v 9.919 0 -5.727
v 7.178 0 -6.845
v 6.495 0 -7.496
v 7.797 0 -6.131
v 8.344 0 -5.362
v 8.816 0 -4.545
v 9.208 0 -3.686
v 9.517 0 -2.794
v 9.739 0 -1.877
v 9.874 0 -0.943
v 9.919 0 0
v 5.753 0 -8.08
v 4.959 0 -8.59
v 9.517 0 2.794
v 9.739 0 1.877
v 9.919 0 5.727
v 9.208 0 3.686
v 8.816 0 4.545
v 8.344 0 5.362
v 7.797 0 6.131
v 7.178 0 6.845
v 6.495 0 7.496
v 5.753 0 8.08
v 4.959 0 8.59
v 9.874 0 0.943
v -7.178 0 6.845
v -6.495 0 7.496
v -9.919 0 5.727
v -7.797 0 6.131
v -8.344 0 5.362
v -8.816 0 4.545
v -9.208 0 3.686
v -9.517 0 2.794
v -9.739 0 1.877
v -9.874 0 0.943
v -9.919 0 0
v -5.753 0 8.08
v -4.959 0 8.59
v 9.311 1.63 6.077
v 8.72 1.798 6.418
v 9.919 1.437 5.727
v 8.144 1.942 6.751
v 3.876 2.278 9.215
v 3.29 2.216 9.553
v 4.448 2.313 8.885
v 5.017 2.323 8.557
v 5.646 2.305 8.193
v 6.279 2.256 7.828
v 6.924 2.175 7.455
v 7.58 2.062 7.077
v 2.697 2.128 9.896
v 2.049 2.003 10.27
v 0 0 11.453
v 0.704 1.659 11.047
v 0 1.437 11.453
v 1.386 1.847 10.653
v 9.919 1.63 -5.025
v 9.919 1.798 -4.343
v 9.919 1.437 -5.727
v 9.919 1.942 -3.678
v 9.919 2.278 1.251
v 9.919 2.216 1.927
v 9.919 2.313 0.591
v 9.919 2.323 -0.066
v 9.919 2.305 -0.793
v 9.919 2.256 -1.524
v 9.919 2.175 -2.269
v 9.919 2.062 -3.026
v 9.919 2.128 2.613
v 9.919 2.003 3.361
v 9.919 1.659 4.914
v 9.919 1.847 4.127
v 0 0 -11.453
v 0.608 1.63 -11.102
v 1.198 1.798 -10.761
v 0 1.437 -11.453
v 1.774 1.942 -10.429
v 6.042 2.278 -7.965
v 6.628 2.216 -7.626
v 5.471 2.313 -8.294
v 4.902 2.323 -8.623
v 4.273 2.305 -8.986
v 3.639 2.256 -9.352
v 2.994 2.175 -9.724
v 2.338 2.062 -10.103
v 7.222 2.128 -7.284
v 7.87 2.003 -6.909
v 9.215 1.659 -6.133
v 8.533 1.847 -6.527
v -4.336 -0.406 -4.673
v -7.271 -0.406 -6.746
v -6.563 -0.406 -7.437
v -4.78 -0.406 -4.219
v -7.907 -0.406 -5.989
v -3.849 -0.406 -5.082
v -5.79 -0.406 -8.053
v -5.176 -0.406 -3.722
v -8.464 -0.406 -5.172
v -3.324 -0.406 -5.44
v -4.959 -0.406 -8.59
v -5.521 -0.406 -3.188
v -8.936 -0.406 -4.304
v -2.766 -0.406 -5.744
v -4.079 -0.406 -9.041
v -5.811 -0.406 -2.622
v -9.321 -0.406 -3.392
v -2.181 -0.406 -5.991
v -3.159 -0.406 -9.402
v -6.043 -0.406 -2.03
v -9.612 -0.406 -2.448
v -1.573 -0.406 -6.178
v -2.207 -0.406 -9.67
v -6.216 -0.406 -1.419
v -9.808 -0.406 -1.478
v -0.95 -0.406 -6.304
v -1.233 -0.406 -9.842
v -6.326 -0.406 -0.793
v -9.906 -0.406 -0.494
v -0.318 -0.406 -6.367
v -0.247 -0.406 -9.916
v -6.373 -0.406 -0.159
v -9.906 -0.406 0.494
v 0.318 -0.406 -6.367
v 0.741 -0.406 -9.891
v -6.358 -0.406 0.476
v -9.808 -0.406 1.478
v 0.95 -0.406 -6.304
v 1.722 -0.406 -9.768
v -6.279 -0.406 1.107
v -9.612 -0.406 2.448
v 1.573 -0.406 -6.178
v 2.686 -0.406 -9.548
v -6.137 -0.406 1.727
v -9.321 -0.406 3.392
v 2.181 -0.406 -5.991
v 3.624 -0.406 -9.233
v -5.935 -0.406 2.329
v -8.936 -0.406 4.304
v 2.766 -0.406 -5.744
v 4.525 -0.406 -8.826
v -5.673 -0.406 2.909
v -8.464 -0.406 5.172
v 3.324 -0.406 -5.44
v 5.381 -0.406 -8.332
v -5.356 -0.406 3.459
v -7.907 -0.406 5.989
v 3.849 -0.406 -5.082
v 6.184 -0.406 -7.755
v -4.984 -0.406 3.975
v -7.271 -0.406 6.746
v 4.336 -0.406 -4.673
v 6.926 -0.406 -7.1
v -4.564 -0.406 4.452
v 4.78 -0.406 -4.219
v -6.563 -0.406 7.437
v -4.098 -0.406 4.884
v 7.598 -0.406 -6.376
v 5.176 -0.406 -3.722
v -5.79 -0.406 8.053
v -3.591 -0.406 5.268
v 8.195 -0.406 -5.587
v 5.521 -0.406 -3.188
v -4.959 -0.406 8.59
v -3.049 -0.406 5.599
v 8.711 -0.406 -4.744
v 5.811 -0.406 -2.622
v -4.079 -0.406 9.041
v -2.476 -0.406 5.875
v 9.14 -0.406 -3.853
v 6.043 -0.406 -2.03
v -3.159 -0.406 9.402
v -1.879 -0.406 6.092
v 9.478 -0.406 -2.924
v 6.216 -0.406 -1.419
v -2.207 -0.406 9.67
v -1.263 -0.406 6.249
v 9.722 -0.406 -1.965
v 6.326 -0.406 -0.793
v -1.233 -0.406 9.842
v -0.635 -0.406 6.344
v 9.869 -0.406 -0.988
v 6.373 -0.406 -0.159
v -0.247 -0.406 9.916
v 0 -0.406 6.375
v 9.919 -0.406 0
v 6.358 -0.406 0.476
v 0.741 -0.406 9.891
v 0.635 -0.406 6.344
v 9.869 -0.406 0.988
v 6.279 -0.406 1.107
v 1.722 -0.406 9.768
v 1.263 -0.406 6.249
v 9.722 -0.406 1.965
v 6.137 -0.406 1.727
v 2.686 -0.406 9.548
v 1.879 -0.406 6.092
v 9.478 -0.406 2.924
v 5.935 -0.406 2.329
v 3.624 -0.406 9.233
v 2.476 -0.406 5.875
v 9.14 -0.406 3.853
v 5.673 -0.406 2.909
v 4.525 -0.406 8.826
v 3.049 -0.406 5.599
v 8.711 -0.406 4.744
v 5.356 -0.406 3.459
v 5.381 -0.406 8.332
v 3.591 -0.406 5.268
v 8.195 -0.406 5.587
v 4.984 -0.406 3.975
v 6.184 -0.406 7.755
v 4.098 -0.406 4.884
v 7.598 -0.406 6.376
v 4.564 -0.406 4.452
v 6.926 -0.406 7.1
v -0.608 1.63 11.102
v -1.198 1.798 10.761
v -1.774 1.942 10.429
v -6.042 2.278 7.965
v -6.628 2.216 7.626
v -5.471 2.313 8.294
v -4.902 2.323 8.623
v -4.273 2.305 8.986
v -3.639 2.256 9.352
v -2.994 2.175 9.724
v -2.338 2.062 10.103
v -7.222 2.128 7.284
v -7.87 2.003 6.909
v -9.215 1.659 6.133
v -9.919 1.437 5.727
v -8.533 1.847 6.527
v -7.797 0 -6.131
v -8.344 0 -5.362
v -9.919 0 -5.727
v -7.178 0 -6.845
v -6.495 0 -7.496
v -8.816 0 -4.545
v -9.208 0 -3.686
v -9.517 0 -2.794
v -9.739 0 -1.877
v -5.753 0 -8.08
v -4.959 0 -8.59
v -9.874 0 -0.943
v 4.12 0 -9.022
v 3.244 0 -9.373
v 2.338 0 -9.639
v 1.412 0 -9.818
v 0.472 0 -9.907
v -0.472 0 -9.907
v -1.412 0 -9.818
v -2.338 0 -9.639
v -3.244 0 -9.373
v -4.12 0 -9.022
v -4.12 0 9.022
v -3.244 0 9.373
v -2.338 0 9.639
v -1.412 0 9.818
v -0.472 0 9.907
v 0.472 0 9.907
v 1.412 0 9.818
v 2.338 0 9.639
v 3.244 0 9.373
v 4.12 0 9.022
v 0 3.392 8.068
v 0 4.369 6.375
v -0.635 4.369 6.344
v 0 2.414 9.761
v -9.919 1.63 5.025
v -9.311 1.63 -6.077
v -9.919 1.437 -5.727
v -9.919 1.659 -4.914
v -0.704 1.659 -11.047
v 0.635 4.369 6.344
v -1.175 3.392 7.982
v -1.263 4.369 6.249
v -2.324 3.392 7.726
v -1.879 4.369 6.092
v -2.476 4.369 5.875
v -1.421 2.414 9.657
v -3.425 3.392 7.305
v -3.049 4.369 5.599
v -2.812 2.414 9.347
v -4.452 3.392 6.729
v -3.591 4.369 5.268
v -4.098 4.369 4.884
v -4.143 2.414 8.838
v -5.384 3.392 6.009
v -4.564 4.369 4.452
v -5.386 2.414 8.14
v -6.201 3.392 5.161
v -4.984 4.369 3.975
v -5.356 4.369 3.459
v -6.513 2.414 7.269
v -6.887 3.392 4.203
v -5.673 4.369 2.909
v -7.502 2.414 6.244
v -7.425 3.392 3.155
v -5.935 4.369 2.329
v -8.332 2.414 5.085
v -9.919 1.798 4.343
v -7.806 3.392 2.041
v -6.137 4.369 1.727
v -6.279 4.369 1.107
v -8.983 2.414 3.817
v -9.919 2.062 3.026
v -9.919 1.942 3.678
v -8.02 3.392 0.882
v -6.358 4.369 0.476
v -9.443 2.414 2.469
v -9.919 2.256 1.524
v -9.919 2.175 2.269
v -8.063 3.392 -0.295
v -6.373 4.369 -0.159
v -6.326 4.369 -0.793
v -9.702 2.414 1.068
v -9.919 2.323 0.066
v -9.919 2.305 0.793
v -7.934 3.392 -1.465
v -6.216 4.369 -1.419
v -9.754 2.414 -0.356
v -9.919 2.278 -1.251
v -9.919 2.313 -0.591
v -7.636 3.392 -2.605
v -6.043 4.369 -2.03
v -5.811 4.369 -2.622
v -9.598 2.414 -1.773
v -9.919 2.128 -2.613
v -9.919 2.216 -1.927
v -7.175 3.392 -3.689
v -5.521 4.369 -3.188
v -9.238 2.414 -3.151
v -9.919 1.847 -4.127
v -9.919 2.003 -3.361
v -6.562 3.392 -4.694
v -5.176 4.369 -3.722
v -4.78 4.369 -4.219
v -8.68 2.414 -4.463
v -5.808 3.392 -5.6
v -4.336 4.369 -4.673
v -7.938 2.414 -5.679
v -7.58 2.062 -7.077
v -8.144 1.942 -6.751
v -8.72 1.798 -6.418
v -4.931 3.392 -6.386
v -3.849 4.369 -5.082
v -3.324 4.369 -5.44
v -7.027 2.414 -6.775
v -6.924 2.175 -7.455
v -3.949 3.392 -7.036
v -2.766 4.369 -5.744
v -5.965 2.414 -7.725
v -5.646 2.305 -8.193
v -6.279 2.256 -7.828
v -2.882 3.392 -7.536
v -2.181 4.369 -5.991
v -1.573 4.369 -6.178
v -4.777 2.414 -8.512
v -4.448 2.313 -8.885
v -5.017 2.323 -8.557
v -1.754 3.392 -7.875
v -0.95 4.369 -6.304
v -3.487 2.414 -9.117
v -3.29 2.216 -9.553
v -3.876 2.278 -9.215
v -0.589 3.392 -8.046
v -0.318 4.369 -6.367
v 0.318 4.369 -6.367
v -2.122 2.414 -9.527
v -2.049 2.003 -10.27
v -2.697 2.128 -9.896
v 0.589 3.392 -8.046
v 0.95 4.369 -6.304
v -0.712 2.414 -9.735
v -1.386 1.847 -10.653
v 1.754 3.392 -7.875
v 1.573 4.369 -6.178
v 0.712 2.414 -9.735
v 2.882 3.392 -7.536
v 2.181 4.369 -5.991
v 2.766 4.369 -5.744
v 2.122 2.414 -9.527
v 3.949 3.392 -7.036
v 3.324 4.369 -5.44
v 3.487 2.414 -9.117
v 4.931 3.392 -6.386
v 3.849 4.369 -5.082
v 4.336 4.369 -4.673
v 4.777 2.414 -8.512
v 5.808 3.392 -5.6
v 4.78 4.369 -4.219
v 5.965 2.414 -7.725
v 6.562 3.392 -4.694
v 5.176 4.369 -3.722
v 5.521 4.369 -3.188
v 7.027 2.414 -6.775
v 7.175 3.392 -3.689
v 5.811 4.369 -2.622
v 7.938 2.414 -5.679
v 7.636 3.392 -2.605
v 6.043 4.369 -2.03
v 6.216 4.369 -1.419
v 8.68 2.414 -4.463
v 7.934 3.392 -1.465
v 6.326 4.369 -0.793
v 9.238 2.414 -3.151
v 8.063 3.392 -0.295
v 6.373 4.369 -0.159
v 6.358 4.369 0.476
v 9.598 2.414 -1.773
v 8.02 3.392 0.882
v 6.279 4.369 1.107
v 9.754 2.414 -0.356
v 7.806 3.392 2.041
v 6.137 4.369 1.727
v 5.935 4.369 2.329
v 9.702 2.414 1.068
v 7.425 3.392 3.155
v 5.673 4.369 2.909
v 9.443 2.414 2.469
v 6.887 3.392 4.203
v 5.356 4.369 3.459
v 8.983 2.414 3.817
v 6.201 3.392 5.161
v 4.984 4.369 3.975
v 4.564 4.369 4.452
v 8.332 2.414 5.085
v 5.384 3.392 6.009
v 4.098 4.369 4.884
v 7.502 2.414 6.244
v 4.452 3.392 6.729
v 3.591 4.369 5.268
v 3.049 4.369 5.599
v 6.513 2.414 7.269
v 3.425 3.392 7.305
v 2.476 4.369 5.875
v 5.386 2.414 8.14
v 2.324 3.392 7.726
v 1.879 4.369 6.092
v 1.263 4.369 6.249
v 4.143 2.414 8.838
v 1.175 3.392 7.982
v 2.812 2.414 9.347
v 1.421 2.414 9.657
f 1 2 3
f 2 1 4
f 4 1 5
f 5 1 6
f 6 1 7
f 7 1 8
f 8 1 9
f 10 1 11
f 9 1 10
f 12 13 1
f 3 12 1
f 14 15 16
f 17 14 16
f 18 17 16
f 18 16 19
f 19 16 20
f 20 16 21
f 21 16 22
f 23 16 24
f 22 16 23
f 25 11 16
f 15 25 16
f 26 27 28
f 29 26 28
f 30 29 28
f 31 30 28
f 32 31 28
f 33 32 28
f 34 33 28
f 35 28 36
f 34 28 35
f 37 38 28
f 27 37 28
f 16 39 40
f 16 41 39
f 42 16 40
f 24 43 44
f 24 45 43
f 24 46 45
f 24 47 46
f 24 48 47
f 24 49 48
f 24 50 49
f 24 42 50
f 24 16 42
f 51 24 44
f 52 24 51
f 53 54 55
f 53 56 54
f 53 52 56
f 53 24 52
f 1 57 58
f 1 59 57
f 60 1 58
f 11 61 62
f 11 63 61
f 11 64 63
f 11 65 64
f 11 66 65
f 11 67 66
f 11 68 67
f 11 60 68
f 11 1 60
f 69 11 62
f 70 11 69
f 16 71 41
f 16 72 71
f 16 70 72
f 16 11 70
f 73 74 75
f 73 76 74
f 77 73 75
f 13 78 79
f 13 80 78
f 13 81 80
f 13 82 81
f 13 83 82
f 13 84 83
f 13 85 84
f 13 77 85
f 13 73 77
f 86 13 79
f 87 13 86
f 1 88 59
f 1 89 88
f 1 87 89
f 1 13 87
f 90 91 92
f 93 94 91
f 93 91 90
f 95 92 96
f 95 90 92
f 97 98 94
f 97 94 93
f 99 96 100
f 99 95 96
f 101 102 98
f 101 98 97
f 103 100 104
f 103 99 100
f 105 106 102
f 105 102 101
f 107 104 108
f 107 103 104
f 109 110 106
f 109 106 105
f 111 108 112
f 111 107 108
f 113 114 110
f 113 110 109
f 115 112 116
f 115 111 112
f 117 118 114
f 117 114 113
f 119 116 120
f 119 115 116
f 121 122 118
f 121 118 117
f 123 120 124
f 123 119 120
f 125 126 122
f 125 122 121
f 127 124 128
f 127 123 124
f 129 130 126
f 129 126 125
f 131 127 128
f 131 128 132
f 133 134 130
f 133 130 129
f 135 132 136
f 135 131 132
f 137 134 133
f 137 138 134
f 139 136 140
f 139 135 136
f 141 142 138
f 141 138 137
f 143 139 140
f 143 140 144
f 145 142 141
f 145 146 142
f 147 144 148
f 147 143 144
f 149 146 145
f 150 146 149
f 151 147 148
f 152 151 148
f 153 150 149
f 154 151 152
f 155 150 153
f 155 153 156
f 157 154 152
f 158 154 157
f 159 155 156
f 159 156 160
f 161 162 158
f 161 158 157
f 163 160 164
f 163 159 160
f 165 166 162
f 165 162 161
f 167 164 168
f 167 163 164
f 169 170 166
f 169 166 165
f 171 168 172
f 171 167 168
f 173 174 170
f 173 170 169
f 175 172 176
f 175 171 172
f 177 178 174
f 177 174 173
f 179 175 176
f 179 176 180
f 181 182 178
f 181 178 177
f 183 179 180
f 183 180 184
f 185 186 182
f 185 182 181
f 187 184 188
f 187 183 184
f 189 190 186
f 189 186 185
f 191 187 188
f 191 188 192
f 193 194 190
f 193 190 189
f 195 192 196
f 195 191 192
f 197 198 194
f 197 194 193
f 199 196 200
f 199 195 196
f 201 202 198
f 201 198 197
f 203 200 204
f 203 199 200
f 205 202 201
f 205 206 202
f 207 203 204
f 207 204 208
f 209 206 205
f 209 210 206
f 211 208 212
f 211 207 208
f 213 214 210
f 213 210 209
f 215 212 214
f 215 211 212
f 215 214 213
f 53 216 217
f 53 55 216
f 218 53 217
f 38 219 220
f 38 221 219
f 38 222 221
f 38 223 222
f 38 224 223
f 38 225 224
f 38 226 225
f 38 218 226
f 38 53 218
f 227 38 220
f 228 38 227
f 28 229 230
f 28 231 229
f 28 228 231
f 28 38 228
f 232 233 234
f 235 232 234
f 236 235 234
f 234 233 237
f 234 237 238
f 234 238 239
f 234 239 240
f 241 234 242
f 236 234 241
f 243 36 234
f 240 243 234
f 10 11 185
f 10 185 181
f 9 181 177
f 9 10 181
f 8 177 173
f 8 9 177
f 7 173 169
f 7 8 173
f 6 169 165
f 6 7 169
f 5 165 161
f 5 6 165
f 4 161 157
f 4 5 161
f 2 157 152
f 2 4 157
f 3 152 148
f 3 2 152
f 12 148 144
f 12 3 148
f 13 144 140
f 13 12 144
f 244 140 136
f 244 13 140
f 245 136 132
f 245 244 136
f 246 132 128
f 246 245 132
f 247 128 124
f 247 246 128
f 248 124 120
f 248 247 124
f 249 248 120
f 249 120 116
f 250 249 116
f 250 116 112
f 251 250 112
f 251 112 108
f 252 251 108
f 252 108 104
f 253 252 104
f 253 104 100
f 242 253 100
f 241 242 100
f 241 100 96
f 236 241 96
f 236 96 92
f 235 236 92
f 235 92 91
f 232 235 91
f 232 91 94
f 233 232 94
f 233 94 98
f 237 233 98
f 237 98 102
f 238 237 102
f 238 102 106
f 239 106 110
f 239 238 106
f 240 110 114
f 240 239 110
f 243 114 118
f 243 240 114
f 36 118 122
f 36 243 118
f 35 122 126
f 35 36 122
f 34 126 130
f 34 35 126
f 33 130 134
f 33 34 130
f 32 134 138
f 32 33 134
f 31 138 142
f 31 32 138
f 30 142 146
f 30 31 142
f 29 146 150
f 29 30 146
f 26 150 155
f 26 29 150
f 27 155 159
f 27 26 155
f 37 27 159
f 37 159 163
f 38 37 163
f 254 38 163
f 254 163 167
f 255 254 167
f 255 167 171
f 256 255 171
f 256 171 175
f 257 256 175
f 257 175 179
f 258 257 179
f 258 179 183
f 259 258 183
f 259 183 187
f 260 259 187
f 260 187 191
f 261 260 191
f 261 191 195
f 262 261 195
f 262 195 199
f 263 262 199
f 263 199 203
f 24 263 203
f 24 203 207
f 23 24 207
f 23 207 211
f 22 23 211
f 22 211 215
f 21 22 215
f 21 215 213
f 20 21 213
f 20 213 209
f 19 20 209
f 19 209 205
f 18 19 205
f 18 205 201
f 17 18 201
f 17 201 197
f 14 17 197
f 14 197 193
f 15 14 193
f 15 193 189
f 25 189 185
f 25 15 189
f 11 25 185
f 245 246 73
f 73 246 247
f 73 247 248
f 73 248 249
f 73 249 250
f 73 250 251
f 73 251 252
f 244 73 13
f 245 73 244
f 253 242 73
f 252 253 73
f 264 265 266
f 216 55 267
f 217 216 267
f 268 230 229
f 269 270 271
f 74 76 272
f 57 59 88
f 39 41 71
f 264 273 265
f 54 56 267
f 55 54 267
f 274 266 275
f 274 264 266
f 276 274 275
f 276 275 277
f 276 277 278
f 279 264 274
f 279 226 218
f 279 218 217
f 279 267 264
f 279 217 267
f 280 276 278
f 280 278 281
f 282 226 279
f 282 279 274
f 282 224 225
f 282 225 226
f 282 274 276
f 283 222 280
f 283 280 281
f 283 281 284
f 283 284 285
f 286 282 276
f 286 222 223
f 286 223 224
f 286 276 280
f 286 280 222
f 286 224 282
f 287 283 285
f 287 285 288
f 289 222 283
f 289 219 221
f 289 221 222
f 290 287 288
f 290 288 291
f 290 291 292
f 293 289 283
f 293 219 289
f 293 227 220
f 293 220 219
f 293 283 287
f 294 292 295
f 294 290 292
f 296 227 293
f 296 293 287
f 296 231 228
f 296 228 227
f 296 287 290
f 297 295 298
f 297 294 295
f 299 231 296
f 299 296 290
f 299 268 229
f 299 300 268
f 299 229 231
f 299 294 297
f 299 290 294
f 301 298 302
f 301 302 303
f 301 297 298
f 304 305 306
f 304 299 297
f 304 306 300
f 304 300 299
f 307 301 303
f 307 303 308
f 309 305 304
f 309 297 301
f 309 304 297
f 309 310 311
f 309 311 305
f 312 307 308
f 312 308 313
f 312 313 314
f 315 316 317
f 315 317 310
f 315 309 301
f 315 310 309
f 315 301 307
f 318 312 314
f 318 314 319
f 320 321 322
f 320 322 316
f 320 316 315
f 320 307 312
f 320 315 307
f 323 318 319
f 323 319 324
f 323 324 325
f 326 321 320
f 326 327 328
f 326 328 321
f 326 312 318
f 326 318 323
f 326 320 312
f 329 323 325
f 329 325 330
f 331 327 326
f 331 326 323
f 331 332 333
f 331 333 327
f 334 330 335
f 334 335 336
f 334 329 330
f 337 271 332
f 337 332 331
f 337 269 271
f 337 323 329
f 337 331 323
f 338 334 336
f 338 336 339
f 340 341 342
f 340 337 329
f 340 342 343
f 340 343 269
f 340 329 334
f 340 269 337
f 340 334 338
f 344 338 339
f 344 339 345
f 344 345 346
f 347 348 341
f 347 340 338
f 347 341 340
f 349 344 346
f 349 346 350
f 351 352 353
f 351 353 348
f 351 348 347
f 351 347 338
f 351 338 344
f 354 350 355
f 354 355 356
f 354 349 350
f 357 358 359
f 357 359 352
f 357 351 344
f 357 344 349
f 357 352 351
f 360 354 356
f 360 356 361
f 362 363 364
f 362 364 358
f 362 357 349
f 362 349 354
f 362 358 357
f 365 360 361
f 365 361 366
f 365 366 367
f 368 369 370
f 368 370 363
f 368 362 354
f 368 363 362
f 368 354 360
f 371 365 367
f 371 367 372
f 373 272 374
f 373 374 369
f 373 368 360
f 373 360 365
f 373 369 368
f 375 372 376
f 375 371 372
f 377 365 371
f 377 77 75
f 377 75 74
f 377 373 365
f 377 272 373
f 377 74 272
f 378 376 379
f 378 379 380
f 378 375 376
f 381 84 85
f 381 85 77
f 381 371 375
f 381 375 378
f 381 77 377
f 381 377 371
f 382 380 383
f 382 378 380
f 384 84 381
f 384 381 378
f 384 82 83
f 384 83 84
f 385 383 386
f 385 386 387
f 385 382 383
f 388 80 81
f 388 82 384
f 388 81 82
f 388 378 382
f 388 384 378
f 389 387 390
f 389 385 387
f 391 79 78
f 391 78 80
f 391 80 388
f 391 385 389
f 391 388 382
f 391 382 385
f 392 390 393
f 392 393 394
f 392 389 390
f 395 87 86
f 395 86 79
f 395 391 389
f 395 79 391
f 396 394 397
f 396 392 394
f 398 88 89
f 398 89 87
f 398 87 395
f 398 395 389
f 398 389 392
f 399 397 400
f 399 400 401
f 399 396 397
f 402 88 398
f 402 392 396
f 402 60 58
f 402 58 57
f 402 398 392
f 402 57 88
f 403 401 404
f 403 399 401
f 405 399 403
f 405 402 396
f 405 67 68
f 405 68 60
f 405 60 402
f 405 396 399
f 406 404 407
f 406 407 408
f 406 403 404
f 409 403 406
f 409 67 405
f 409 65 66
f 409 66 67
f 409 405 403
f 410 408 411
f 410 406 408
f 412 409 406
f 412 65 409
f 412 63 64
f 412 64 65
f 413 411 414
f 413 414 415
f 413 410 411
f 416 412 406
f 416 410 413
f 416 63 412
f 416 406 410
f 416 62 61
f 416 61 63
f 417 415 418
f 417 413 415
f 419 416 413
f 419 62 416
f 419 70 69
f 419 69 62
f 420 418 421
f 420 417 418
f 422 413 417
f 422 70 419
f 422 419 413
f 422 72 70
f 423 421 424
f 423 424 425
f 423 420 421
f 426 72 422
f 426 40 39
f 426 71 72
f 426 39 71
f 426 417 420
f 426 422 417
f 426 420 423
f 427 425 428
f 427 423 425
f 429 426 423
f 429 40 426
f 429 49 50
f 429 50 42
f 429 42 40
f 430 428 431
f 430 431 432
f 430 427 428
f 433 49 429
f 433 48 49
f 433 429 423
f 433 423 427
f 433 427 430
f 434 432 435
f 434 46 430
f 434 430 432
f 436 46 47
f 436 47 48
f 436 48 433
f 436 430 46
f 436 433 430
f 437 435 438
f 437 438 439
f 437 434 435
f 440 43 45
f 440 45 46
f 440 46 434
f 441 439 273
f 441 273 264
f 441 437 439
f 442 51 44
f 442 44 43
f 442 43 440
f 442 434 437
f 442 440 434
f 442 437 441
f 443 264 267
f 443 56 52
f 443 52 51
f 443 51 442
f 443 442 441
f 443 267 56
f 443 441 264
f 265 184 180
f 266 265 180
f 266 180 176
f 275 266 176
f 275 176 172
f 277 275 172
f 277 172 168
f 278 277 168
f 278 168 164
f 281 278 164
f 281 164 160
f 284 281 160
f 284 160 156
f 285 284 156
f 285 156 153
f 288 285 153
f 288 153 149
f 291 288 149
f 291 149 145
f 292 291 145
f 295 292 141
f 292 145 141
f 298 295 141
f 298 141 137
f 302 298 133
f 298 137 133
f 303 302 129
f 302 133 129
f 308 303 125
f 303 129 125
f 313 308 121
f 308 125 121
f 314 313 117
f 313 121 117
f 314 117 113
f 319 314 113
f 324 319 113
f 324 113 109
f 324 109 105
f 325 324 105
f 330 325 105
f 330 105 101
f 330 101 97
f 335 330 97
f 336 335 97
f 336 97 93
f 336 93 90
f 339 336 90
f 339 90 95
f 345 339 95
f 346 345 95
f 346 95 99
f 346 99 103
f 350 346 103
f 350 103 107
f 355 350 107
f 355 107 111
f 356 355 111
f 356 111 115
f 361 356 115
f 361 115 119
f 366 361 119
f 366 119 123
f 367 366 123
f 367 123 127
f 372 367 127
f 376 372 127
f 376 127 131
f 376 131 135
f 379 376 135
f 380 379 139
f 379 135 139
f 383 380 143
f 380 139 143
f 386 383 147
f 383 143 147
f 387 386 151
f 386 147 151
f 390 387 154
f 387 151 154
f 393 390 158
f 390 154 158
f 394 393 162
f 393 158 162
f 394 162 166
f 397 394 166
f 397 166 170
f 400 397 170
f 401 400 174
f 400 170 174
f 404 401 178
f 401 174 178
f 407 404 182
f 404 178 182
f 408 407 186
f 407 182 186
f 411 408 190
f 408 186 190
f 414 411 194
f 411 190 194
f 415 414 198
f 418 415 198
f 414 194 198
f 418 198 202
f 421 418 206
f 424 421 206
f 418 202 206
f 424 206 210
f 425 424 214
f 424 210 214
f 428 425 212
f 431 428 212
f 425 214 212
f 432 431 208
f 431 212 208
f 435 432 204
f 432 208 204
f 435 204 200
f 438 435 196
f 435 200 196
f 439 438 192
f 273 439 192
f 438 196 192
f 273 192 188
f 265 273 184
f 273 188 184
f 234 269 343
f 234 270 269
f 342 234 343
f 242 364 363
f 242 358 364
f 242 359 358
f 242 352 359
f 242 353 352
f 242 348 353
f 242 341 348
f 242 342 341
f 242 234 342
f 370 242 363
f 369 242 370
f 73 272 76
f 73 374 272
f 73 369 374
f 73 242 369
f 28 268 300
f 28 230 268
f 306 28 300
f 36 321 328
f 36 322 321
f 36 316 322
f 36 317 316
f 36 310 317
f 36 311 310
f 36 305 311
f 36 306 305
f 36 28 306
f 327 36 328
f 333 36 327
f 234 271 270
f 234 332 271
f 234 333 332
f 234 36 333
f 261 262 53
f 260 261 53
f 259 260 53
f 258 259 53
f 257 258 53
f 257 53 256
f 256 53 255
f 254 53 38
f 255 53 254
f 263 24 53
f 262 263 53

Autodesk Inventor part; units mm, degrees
ref_plane "YZ Plane" through (0, 0, 0) normal (1, 0, 0) x (0, 1, 0)
ref_plane "XZ Plane" through (0, 0, 0) normal (0, 1, 0) x (-1, 0, 0)
sketch "Sketch1" plane through (0, 0, 0) normal (0, 1, 0) x (-1, 0, 0)
  circle A0 centre (0, 0) radius 9.9187
  line L0 (9.9187, -5.7266) -> (0, -11.4531)
  line L1 (0, -11.4531) -> (-9.9187, -5.7266)
  line L2 (-9.9187, -5.7266) -> (-9.9187, 5.7266)
  line L3 (-9.9187, 5.7266) -> (0, 11.4531)
  line L4 (0, 11.4531) -> (9.9187, 5.7266)
  line L5 (9.9187, 5.7266) -> (9.9187, -5.7266)
  line L6 (0, 13.376) -> (0, -12.9473) construction
  point P0 (9.9187, 0)
  dimension "d0" = 19.8374
extrude "Extrusion1" add sketch "Sketch1" along normal blind 4.3688
sketch "Sketch2" plane through (0, 0, 0) normal (0, -1, 0) x (1, 0, 0)
  circle A0 centre (0, 0) radius 9.9187
  line L0 (0, 11.4531) -> (9.9187, 5.7266) projected
extrude "Extrusion2" add sketch "Sketch2" along normal blind 0.4064
sketch "Sketch3" plane through (0, 4.3688, 0) normal (0, 1, 0) x (1, 0, 0)
  point P0 (0, 0)
  point P1 (0, 0)
hole "Hole1" at (0, 4.3688, 0) direction (0, -1, 0) diameter 12.7508 end through all
thread "Thread1" size "9/16-18 UNF" class "2B" standard "ANSI Unified Screw Threads" full length
ref_plane "Work Plane1" through (0, 0, -5.7266) normal (1, 0, 0) x (0, 0, -1)
sketch "Sketch5" plane through (0, 0, -5.7266) normal (1, 0, 0) x (0, 0, -1)
  line L0 (-12.102, 4.3688) -> (0.6488, 4.3688) projected
  line L1 (-12.102, 4.3688) -> (-17.1797, 4.3688)
  line L2 (-12.102, 4.3688) -> (-17.1797, 1.4372)
  line L3 (-17.1797, 1.4372) -> (-17.1797, 4.3688)
  line L4 (-5.7266, 0) -> (-5.7266, 18.228)
  dimension "d17" = 30
revolve "Revolution1" cut sketch "Sketch5" angle 360 about axis through (0, 0, 0) along (0, 1, 0)
properties part number "13_8"
